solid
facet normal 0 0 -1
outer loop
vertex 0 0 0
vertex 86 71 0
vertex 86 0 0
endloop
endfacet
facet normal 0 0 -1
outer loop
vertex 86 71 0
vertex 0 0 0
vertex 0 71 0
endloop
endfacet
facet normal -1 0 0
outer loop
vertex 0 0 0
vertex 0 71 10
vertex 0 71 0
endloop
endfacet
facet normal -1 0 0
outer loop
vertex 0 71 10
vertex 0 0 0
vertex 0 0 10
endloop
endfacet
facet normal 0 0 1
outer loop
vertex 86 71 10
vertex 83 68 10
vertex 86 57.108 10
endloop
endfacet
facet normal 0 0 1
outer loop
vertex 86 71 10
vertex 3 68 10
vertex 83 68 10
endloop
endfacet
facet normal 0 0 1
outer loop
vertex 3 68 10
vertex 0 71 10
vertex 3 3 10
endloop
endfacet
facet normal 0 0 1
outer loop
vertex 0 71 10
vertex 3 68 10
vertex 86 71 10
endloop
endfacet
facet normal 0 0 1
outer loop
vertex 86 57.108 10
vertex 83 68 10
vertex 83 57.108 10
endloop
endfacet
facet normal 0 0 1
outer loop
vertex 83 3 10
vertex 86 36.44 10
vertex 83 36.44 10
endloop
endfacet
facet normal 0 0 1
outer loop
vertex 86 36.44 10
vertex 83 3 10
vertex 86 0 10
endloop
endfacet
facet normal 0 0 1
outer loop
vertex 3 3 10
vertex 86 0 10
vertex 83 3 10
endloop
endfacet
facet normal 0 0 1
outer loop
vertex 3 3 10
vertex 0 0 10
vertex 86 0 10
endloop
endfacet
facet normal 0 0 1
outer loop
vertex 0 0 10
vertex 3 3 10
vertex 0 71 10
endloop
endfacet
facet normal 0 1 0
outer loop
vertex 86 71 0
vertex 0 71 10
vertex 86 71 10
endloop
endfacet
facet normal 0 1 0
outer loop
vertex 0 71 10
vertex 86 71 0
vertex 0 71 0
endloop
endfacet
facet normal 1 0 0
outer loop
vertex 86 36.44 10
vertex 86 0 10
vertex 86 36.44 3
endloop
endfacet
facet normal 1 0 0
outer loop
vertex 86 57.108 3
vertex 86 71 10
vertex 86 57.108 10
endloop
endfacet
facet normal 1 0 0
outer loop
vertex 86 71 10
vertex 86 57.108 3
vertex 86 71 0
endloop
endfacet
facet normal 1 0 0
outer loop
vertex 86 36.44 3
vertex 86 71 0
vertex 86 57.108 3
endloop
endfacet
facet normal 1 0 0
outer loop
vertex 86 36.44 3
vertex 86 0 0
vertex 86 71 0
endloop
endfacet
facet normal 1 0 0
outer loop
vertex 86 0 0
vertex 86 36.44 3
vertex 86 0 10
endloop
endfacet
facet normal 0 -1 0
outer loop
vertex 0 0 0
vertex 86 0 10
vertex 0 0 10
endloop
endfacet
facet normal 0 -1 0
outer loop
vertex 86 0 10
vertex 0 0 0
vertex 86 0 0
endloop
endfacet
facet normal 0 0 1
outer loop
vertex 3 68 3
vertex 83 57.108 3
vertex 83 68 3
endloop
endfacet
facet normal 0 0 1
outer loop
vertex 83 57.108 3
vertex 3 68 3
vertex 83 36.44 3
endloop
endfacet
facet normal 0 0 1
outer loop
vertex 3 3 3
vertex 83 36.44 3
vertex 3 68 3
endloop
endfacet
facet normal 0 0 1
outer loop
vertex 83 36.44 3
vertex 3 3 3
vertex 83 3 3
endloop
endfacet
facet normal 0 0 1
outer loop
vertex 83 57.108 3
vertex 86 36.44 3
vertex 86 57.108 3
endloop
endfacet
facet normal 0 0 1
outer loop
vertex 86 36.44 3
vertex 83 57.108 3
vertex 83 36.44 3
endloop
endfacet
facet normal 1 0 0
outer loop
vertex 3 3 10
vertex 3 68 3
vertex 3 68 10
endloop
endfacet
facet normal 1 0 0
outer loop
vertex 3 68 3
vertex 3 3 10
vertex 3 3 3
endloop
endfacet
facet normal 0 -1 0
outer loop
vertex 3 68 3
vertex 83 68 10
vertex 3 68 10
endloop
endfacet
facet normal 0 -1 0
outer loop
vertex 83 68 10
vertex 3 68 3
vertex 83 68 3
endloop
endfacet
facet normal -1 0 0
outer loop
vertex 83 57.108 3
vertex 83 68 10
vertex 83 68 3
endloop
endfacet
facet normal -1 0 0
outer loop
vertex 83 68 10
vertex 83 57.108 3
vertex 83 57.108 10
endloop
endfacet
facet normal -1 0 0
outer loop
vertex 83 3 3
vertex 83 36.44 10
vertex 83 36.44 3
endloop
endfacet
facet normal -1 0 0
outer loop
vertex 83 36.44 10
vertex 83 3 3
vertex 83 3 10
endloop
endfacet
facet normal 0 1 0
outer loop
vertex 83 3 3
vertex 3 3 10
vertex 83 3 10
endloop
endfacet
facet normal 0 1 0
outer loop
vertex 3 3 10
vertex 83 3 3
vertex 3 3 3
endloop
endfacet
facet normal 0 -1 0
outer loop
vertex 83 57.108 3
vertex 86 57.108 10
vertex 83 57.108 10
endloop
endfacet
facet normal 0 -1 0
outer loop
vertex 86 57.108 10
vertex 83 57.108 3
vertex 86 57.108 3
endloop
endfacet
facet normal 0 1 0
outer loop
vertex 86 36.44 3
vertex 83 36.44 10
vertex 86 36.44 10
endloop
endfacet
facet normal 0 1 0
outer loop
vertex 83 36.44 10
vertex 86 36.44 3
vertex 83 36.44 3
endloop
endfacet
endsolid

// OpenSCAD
PCB_X_LENGTH = 80;
PCB_Y_LENGTH =  65;

BOTTOM_CHASSIS_THICKNESS = 3;
BOTTOM_CHASSIS_HEIGHT = 10;


// TODO move to common file for upper enclousure
SCREW_CONNECTORS_Y = 33.440;
SCREW_CONNECTORS_DY = 20.668;


module Enclousure()
{
    difference()
    {
        linear_extrude(height = BOTTOM_CHASSIS_HEIGHT, convexity = 10, twist = 0)
            square([PCB_X_LENGTH + 2*BOTTOM_CHASSIS_THICKNESS, PCB_Y_LENGTH + 2*BOTTOM_CHASSIS_THICKNESS]);

        translate([BOTTOM_CHASSIS_THICKNESS, BOTTOM_CHASSIS_THICKNESS, BOTTOM_CHASSIS_THICKNESS])
                linear_extrude(height = BOTTOM_CHASSIS_HEIGHT - BOTTOM_CHASSIS_THICKNESS, convexity = 10, twist = 0)
                    square([PCB_X_LENGTH , PCB_Y_LENGTH ]);
    }
}


module ScrewConnectors()
{
    translate([PCB_X_LENGTH+BOTTOM_CHASSIS_THICKNESS, SCREW_CONNECTORS_Y+BOTTOM_CHASSIS_THICKNESS, BOTTOM_CHASSIS_THICKNESS])
        linear_extrude(height = BOTTOM_CHASSIS_HEIGHT, convexity = 10, twist = 0)     
            square([BOTTOM_CHASSIS_THICKNESS, SCREW_CONNECTORS_DY]);
}

difference() {
    Enclousure();
    ScrewConnectors();
}
